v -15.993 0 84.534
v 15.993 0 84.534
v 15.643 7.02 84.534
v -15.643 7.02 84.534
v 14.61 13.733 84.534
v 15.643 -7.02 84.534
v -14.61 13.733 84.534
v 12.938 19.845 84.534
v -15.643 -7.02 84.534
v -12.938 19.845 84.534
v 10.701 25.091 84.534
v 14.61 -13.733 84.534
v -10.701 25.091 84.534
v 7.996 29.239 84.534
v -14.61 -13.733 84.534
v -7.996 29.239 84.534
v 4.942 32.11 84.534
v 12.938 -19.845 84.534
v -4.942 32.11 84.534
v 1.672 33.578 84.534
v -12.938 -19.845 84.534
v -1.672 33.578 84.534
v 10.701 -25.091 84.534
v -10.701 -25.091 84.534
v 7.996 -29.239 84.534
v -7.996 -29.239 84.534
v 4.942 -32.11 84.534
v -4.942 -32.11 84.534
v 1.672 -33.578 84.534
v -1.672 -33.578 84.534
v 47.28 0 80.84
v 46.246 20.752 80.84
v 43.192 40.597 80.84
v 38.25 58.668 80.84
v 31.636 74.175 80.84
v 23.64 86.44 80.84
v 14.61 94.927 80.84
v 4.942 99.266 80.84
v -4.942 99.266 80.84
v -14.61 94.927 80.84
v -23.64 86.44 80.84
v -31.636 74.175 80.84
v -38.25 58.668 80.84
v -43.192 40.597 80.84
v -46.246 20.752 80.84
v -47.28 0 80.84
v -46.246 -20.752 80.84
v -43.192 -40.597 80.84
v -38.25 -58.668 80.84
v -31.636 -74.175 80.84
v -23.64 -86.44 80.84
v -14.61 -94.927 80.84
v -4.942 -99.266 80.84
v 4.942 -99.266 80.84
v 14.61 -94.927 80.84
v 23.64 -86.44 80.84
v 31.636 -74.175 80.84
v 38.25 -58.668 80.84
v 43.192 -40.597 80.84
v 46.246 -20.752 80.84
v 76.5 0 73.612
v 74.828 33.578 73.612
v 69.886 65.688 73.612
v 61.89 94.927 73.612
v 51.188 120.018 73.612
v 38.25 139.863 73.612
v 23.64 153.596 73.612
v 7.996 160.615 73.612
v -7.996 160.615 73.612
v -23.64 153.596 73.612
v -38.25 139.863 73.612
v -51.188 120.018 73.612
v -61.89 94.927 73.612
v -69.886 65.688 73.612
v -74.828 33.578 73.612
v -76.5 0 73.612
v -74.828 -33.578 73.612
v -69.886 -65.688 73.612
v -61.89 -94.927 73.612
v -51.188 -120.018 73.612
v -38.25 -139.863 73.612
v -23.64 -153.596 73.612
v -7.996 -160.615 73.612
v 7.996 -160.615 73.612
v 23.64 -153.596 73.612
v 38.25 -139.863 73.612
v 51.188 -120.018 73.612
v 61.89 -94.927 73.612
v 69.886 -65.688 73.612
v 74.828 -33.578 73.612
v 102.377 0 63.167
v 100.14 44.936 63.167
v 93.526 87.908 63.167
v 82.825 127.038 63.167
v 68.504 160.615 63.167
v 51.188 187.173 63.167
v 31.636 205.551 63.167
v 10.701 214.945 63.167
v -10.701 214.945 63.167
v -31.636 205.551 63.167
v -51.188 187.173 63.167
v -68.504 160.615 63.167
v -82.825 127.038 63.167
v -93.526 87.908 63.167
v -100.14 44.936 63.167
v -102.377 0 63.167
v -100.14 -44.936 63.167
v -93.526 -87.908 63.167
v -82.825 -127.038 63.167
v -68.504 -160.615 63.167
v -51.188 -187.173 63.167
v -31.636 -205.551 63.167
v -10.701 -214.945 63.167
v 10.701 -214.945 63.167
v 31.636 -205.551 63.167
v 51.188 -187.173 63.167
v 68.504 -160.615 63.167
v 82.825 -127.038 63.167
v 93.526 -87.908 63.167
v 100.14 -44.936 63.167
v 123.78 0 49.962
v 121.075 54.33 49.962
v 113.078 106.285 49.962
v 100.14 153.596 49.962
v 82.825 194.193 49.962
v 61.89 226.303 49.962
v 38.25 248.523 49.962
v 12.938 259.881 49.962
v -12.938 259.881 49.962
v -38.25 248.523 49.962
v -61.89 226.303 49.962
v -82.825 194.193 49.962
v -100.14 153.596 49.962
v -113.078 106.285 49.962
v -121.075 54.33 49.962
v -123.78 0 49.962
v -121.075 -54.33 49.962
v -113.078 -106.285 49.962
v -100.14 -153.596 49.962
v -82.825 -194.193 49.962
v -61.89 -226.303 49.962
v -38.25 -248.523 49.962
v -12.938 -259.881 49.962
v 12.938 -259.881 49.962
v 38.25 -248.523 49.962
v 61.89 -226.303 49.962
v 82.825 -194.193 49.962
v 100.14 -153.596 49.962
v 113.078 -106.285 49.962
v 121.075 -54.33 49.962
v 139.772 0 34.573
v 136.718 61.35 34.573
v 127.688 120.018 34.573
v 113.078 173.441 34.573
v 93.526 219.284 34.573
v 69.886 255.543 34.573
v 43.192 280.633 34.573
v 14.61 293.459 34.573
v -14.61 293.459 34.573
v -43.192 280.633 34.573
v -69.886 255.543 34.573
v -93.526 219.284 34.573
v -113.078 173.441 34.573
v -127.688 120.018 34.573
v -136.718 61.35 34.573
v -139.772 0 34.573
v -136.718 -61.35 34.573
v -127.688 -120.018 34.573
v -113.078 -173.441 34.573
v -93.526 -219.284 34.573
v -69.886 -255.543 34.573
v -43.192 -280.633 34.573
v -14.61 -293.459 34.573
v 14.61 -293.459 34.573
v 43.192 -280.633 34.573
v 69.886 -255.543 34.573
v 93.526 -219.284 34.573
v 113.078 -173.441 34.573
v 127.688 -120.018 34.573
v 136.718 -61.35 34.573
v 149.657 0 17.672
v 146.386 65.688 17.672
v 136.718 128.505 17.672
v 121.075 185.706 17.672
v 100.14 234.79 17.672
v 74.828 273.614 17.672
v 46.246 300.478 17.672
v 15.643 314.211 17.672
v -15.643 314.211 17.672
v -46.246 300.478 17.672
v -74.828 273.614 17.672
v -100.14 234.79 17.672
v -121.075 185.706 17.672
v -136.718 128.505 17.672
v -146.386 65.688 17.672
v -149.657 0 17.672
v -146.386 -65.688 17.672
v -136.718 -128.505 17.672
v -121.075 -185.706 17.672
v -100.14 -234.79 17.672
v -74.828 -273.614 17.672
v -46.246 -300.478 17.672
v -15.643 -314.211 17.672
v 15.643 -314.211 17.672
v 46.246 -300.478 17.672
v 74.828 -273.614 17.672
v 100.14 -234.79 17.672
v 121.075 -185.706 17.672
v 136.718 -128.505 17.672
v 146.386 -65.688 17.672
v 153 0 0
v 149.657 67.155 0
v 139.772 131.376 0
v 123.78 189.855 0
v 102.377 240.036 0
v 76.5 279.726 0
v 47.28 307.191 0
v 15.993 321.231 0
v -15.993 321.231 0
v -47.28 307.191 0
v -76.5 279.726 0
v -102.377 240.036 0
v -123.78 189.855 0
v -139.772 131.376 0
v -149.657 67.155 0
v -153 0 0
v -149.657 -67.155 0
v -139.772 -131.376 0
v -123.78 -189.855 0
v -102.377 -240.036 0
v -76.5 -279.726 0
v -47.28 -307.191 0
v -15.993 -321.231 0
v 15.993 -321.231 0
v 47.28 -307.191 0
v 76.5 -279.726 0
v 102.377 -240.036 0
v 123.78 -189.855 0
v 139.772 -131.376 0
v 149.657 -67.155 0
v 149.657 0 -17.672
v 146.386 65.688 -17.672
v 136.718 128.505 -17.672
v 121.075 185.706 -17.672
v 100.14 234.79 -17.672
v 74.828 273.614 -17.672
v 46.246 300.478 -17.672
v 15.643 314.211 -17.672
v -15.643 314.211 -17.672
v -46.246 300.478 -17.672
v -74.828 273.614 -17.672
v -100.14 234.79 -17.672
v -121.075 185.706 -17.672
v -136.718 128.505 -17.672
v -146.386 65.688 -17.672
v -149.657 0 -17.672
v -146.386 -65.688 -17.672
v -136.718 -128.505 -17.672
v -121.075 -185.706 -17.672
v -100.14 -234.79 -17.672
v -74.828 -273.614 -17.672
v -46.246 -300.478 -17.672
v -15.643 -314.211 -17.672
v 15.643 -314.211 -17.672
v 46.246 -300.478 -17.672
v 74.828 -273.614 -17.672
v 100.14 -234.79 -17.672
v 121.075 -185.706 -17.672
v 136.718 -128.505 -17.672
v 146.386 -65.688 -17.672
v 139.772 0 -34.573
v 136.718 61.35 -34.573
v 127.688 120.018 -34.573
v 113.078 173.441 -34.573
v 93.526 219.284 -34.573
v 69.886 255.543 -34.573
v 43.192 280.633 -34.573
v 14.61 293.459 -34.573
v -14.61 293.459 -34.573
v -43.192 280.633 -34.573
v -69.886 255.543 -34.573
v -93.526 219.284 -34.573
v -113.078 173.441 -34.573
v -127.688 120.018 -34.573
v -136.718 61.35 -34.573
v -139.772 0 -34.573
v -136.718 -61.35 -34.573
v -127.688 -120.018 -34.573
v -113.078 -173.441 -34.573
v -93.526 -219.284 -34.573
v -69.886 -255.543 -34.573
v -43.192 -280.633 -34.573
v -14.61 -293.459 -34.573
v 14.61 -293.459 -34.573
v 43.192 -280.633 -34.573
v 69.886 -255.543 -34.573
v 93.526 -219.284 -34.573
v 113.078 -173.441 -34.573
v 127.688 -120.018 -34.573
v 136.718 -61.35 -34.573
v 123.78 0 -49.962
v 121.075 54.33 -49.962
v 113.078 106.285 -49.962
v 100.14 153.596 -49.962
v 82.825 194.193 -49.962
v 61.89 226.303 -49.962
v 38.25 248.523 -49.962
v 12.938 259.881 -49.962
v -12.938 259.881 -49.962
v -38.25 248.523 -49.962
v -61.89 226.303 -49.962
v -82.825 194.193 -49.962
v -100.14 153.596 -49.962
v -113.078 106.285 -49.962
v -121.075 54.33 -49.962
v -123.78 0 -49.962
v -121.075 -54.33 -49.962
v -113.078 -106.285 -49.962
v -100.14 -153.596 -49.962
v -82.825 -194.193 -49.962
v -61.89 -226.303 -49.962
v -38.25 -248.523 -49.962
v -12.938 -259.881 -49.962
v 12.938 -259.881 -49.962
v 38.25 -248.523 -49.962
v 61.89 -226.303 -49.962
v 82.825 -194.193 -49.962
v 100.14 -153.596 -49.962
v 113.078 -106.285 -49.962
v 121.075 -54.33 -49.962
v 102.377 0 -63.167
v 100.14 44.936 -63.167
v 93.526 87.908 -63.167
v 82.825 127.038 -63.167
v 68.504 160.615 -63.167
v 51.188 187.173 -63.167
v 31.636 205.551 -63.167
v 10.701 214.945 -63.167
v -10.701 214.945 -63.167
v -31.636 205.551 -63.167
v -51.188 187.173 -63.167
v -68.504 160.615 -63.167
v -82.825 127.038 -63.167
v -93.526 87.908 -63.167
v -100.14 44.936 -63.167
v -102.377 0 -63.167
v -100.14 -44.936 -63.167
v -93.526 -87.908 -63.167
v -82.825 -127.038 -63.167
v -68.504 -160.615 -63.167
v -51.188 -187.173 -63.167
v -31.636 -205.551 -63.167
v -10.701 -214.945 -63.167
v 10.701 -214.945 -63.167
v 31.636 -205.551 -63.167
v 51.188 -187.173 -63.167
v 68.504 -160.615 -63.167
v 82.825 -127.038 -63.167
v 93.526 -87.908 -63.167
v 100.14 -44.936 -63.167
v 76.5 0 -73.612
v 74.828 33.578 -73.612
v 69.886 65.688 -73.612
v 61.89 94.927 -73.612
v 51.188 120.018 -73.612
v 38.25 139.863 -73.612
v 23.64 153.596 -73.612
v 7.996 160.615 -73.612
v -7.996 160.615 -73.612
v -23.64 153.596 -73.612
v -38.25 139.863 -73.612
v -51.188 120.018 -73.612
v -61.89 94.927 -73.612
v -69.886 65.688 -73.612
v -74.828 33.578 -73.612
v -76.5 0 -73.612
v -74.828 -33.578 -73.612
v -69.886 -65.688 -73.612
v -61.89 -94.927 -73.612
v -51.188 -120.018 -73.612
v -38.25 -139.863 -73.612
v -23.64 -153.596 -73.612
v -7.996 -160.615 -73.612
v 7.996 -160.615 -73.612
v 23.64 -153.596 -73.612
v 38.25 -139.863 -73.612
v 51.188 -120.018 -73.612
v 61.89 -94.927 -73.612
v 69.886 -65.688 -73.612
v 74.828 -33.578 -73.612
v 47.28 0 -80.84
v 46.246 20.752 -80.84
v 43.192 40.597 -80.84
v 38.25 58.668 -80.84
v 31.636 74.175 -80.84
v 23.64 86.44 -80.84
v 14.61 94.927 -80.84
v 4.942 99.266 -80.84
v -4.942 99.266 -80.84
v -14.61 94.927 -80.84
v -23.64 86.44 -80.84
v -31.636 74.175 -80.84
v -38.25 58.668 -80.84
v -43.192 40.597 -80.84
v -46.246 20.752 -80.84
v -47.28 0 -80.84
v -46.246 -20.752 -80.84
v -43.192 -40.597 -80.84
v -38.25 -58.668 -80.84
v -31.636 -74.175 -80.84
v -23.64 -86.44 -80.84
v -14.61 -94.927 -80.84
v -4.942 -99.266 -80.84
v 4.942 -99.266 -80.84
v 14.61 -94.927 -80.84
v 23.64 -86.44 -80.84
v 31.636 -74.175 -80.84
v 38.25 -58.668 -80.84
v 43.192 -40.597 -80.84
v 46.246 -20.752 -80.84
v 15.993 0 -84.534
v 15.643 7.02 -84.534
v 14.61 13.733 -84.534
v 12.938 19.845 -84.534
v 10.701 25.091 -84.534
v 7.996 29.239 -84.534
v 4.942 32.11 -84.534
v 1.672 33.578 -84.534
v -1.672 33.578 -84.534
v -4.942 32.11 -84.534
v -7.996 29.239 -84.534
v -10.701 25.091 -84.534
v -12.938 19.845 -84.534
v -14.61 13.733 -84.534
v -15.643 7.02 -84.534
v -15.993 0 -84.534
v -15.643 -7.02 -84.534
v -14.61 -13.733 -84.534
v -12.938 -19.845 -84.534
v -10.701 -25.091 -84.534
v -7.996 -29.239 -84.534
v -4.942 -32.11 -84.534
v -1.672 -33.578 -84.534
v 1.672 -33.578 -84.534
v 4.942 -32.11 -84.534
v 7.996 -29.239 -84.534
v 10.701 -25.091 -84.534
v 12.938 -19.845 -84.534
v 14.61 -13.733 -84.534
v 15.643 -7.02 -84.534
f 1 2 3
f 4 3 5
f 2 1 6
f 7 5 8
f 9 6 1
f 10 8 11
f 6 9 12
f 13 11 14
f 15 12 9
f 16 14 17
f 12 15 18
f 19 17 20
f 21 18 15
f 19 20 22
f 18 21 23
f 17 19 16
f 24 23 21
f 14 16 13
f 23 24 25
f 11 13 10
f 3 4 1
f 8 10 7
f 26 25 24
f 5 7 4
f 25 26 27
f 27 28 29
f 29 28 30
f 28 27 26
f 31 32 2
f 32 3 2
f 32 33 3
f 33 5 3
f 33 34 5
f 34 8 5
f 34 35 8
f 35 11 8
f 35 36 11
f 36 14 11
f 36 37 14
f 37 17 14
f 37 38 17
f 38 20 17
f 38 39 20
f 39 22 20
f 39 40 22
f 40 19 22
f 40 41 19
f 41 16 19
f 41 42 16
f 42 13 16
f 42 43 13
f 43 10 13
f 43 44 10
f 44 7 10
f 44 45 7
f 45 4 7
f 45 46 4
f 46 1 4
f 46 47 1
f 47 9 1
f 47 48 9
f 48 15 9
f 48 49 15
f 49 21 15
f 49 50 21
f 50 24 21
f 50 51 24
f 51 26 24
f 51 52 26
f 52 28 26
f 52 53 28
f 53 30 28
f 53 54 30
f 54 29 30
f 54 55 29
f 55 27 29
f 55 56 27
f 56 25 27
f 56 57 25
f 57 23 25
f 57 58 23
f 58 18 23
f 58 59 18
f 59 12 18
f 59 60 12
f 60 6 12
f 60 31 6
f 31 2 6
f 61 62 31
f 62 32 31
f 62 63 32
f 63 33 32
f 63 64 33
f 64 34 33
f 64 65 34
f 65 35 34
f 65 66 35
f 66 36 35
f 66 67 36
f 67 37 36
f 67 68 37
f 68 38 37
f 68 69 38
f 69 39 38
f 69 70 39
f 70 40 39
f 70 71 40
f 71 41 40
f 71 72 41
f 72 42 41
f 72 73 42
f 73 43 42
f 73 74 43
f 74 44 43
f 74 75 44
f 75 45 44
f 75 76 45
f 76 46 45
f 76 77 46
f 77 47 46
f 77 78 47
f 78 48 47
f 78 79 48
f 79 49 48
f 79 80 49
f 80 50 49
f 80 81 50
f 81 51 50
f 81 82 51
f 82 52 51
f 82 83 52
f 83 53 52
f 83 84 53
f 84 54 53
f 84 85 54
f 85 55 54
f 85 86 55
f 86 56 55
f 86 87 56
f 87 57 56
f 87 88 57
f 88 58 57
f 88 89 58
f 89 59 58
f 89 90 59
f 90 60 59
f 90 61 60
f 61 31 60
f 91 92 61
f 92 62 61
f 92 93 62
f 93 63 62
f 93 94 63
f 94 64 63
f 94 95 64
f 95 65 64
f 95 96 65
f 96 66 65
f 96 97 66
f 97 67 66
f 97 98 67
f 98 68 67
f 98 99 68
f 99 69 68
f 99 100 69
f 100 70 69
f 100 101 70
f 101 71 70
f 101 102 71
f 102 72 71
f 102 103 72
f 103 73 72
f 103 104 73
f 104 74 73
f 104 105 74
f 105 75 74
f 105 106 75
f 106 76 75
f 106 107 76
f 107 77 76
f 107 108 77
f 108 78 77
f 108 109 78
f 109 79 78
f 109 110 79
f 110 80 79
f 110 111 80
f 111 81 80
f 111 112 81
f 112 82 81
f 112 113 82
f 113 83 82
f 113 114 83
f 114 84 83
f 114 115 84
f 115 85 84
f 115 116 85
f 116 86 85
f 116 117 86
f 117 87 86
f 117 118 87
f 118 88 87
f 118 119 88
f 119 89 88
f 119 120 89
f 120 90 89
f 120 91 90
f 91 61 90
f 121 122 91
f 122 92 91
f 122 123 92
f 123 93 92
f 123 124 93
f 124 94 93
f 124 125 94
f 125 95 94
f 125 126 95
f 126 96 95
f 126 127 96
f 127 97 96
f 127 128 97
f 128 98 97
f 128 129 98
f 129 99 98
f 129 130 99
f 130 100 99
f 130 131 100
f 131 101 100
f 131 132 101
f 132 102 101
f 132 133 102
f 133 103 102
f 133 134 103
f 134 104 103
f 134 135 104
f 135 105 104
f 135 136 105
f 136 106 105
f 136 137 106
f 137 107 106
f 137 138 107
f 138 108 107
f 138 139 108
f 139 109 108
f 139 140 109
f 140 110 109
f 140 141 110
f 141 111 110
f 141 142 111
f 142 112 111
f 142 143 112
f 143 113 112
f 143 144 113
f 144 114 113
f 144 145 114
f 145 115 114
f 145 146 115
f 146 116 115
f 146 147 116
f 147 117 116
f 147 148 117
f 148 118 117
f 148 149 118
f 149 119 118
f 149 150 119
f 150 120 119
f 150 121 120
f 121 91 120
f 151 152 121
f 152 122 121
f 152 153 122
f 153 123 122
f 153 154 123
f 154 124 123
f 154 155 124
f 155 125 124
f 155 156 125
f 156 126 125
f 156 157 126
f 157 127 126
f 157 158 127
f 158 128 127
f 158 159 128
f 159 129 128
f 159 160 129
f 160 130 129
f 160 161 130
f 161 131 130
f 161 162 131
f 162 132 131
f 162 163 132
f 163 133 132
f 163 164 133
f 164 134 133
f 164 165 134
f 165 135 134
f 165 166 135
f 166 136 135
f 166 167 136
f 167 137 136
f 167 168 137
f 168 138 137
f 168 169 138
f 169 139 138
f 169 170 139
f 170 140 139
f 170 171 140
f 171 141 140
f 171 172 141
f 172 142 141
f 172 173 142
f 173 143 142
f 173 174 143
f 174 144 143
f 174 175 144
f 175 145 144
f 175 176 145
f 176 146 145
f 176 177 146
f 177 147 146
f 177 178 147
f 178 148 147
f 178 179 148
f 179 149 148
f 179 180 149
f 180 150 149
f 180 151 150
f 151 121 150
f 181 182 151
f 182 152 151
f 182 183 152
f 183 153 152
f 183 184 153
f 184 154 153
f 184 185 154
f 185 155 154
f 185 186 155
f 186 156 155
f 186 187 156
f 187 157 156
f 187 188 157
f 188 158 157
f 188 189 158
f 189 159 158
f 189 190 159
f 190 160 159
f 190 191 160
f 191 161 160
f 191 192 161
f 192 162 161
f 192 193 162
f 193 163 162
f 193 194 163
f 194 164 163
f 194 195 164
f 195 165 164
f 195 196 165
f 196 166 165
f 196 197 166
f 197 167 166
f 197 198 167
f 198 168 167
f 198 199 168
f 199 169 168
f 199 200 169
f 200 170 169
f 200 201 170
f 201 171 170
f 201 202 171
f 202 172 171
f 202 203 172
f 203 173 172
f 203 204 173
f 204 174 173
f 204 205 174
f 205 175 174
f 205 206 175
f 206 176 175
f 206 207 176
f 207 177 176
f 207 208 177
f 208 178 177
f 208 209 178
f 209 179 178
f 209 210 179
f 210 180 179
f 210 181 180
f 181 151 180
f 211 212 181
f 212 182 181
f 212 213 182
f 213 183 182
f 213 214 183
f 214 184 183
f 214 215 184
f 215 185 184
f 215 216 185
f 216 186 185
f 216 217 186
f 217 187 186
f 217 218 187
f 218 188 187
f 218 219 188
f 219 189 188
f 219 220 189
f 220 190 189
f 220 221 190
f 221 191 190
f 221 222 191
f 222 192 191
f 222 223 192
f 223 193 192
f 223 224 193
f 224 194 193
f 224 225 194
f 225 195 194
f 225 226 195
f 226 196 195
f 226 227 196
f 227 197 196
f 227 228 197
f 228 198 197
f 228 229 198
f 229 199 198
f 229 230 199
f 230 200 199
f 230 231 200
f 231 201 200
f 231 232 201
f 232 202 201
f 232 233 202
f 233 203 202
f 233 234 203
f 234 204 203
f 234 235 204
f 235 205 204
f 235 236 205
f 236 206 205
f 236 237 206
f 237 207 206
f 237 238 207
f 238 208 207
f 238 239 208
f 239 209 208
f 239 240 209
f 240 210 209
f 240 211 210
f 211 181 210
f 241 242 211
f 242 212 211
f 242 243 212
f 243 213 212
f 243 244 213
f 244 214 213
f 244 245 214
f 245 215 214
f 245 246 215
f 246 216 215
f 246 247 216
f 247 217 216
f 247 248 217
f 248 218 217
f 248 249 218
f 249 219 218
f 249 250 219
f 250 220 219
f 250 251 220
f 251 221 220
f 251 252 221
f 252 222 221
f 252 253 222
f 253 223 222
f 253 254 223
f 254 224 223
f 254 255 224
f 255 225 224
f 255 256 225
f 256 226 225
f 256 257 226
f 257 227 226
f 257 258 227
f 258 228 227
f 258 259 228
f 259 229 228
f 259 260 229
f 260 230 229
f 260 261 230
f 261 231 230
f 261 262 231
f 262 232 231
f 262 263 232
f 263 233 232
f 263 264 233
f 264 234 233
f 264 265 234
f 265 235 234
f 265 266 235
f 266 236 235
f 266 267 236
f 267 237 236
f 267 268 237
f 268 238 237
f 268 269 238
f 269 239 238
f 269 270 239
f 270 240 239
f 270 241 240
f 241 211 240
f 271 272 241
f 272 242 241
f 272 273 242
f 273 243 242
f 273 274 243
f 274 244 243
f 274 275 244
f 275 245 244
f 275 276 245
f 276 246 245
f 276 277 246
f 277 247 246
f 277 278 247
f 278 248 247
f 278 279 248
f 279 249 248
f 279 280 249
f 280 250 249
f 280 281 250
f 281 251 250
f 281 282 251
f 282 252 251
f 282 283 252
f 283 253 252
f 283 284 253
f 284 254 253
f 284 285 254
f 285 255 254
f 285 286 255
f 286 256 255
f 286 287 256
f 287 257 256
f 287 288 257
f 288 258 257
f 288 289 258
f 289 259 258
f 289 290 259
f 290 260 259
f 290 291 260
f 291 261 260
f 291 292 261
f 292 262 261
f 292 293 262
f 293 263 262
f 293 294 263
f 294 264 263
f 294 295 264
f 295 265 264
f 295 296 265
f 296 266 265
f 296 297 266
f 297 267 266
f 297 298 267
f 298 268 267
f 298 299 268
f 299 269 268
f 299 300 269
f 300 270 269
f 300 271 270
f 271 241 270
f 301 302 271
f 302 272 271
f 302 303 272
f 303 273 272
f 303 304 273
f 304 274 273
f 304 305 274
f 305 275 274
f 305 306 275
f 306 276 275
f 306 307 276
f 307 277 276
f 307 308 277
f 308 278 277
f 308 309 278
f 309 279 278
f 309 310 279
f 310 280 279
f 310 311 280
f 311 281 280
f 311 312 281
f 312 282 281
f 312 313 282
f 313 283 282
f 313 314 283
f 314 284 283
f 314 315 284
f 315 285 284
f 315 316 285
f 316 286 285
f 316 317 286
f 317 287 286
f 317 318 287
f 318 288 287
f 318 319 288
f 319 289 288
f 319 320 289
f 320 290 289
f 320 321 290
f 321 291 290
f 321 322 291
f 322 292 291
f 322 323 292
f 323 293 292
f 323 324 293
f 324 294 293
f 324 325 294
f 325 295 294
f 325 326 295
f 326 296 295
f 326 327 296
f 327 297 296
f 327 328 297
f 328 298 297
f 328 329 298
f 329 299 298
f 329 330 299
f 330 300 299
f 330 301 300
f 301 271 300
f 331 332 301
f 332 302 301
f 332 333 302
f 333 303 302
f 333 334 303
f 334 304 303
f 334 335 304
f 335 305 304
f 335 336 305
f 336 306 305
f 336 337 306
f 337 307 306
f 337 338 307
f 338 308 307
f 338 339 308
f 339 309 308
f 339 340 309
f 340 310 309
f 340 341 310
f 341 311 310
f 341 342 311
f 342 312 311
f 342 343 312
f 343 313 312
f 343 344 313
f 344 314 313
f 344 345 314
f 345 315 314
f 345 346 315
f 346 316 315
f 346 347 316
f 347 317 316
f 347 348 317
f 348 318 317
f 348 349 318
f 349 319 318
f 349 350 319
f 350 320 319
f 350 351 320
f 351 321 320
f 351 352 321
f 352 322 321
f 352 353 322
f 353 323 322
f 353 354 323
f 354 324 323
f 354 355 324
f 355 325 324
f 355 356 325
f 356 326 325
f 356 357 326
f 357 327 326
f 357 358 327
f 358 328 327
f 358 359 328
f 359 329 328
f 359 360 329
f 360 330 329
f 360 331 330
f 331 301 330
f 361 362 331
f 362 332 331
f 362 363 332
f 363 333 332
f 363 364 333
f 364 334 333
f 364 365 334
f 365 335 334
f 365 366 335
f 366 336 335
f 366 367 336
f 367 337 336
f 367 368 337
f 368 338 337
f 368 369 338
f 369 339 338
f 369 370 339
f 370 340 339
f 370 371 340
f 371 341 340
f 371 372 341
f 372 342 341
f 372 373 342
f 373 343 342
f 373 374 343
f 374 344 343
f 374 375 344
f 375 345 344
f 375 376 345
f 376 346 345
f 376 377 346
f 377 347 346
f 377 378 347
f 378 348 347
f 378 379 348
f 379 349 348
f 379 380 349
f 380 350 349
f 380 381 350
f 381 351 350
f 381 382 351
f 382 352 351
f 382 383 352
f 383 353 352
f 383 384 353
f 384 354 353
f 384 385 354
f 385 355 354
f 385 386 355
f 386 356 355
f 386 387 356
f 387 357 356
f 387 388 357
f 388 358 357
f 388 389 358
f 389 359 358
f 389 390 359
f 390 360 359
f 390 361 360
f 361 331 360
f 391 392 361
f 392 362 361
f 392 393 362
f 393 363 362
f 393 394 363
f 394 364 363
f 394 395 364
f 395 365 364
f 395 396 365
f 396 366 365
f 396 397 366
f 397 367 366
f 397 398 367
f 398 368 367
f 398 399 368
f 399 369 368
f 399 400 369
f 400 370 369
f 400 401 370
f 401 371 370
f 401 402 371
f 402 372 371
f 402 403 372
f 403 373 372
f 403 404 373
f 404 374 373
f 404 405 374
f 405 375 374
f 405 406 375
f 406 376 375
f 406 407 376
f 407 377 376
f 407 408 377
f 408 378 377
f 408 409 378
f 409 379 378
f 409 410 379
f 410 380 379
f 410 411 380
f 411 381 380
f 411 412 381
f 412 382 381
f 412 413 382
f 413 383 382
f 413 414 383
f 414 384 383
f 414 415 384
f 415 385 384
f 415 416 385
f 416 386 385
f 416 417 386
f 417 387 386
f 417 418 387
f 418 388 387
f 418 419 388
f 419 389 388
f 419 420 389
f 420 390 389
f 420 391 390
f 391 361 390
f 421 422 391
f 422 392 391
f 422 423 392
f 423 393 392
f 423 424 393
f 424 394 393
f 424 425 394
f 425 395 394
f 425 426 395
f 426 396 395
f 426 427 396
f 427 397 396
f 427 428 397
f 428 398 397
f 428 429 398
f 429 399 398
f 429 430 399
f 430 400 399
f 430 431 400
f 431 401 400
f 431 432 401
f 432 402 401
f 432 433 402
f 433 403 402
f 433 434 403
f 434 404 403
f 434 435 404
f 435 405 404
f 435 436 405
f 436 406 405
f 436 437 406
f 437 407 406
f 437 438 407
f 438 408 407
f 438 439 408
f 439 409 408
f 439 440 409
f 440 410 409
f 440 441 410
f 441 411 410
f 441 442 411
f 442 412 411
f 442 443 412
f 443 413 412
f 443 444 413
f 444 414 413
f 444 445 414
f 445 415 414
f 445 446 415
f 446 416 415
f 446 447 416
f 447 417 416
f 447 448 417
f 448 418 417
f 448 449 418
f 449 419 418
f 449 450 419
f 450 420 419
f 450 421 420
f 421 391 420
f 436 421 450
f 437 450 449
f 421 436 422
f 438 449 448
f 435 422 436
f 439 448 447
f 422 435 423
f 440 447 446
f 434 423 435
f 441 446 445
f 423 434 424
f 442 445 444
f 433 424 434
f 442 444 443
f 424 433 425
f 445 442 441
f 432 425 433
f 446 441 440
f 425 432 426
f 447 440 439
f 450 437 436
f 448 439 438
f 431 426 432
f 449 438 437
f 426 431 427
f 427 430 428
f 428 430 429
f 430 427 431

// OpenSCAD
// Generated by SolidPython 1.0.1 on 2020-07-29 00:46:49


scale(v = [9, 19, 5]) {
	sphere(r = 17);
}
/***********************************************
*********      SolidPython code:      **********
************************************************
 
# import packages: SolidPython
from solid import *
from solid.utils import *
from itertools import chain, combinations, permutations


class Resize:

    def __init__(self, scad_file):
        self.scad_file = scad_file
        #self.scad_file = import_scad(scad_file)
        # cone/cylinder param:
        self.r1 = 0
        self.r2 = 0
        self.h = 0
        # rectangular prism param:
        self.w = 0
        self.l = 0
        # ellipse param:
        self.r = 0

    # import OpenScad code (file name corresponds to shape)


    # classify shape + parameters
    def assign(self, param1, param2, param3):
        if self.scad_file == 'cone.scad':
            self.r1 = param1
            self.r2 = param2
            self.h = param3
        elif self.scad_file == 'cylinder.scad':
            self.r1 = param1
            self.r2 = param2
            self.h = param3
        elif self.scad_file == 'rectangularPrism.scad':
            self.h = param1
            self.l = param2
            self.w = param3
        else:
            self.r = param1
            self.h = param2

    # resize parameters
    def iterate(self):
        x = range(3, 20, 2)
        i = 1
        if self.scad_file == 'cone.scad':
            tempList = list(permutations(x, 2))
            for temp in tempList:
                param1 = temp[0]
                param2 = temp[1]
                filepath = 'produced_scad_files/' + 'cone' + str(param1) + '_' + str(param2) + '_' + '.scad'
                scad_render_to_file(cylinder(h=param1, r1=param2, r2=0), filepath)

        elif self.scad_file == 'cylinder.scad':
            tempList = list(permutations(x, 3))
            for temp in tempList:
                param1 = temp[0]
                param2 = temp[1]
                filepath = 'produced_scad_files/' + 'cylinder' + str(param1) + '_' + str(param2) + '_' + '.scad'
                scad_render_to_file(cylinder(h=param1, r1=param2, r2=param2), filepath)

        elif self.scad_file == 'rectangularPrism.scad':
            tempList = list(permutations(x, 3))
            for temp in tempList:
                param1 = temp[0]
                param2 = temp[1]
                param3 = temp[2]
                filepath = 'produced_scad_files/' + 'rectangularPrism' + str(param1) + '_' + str(param2) + '_' + str(
                    param3) + '.scad'
                scad_render_to_file(cube(size=(param1, param2, param3)), filepath)

        elif self.scad_file == 'ellipse.scad':
            tempList = list(permutations(x, 4))
            for temp in tempList:
                param1 = temp[0]
                param2 = temp[1]
                param3 = temp[2]
                param4 = temp[3]
                filepath = 'produced_scad_files/' + 'ellipse' + str(param1) + '_' + str(param2) + '_' + str(param3) + '_' + str(param4) + '.scad'
                scad_render_to_file(scale([param1, param2, param3])(sphere(r=param4)), filepath)

    def render_to_scadfile(self):
        scad_render_to_file(scad, 'example.scad') 
 
************************************************/
